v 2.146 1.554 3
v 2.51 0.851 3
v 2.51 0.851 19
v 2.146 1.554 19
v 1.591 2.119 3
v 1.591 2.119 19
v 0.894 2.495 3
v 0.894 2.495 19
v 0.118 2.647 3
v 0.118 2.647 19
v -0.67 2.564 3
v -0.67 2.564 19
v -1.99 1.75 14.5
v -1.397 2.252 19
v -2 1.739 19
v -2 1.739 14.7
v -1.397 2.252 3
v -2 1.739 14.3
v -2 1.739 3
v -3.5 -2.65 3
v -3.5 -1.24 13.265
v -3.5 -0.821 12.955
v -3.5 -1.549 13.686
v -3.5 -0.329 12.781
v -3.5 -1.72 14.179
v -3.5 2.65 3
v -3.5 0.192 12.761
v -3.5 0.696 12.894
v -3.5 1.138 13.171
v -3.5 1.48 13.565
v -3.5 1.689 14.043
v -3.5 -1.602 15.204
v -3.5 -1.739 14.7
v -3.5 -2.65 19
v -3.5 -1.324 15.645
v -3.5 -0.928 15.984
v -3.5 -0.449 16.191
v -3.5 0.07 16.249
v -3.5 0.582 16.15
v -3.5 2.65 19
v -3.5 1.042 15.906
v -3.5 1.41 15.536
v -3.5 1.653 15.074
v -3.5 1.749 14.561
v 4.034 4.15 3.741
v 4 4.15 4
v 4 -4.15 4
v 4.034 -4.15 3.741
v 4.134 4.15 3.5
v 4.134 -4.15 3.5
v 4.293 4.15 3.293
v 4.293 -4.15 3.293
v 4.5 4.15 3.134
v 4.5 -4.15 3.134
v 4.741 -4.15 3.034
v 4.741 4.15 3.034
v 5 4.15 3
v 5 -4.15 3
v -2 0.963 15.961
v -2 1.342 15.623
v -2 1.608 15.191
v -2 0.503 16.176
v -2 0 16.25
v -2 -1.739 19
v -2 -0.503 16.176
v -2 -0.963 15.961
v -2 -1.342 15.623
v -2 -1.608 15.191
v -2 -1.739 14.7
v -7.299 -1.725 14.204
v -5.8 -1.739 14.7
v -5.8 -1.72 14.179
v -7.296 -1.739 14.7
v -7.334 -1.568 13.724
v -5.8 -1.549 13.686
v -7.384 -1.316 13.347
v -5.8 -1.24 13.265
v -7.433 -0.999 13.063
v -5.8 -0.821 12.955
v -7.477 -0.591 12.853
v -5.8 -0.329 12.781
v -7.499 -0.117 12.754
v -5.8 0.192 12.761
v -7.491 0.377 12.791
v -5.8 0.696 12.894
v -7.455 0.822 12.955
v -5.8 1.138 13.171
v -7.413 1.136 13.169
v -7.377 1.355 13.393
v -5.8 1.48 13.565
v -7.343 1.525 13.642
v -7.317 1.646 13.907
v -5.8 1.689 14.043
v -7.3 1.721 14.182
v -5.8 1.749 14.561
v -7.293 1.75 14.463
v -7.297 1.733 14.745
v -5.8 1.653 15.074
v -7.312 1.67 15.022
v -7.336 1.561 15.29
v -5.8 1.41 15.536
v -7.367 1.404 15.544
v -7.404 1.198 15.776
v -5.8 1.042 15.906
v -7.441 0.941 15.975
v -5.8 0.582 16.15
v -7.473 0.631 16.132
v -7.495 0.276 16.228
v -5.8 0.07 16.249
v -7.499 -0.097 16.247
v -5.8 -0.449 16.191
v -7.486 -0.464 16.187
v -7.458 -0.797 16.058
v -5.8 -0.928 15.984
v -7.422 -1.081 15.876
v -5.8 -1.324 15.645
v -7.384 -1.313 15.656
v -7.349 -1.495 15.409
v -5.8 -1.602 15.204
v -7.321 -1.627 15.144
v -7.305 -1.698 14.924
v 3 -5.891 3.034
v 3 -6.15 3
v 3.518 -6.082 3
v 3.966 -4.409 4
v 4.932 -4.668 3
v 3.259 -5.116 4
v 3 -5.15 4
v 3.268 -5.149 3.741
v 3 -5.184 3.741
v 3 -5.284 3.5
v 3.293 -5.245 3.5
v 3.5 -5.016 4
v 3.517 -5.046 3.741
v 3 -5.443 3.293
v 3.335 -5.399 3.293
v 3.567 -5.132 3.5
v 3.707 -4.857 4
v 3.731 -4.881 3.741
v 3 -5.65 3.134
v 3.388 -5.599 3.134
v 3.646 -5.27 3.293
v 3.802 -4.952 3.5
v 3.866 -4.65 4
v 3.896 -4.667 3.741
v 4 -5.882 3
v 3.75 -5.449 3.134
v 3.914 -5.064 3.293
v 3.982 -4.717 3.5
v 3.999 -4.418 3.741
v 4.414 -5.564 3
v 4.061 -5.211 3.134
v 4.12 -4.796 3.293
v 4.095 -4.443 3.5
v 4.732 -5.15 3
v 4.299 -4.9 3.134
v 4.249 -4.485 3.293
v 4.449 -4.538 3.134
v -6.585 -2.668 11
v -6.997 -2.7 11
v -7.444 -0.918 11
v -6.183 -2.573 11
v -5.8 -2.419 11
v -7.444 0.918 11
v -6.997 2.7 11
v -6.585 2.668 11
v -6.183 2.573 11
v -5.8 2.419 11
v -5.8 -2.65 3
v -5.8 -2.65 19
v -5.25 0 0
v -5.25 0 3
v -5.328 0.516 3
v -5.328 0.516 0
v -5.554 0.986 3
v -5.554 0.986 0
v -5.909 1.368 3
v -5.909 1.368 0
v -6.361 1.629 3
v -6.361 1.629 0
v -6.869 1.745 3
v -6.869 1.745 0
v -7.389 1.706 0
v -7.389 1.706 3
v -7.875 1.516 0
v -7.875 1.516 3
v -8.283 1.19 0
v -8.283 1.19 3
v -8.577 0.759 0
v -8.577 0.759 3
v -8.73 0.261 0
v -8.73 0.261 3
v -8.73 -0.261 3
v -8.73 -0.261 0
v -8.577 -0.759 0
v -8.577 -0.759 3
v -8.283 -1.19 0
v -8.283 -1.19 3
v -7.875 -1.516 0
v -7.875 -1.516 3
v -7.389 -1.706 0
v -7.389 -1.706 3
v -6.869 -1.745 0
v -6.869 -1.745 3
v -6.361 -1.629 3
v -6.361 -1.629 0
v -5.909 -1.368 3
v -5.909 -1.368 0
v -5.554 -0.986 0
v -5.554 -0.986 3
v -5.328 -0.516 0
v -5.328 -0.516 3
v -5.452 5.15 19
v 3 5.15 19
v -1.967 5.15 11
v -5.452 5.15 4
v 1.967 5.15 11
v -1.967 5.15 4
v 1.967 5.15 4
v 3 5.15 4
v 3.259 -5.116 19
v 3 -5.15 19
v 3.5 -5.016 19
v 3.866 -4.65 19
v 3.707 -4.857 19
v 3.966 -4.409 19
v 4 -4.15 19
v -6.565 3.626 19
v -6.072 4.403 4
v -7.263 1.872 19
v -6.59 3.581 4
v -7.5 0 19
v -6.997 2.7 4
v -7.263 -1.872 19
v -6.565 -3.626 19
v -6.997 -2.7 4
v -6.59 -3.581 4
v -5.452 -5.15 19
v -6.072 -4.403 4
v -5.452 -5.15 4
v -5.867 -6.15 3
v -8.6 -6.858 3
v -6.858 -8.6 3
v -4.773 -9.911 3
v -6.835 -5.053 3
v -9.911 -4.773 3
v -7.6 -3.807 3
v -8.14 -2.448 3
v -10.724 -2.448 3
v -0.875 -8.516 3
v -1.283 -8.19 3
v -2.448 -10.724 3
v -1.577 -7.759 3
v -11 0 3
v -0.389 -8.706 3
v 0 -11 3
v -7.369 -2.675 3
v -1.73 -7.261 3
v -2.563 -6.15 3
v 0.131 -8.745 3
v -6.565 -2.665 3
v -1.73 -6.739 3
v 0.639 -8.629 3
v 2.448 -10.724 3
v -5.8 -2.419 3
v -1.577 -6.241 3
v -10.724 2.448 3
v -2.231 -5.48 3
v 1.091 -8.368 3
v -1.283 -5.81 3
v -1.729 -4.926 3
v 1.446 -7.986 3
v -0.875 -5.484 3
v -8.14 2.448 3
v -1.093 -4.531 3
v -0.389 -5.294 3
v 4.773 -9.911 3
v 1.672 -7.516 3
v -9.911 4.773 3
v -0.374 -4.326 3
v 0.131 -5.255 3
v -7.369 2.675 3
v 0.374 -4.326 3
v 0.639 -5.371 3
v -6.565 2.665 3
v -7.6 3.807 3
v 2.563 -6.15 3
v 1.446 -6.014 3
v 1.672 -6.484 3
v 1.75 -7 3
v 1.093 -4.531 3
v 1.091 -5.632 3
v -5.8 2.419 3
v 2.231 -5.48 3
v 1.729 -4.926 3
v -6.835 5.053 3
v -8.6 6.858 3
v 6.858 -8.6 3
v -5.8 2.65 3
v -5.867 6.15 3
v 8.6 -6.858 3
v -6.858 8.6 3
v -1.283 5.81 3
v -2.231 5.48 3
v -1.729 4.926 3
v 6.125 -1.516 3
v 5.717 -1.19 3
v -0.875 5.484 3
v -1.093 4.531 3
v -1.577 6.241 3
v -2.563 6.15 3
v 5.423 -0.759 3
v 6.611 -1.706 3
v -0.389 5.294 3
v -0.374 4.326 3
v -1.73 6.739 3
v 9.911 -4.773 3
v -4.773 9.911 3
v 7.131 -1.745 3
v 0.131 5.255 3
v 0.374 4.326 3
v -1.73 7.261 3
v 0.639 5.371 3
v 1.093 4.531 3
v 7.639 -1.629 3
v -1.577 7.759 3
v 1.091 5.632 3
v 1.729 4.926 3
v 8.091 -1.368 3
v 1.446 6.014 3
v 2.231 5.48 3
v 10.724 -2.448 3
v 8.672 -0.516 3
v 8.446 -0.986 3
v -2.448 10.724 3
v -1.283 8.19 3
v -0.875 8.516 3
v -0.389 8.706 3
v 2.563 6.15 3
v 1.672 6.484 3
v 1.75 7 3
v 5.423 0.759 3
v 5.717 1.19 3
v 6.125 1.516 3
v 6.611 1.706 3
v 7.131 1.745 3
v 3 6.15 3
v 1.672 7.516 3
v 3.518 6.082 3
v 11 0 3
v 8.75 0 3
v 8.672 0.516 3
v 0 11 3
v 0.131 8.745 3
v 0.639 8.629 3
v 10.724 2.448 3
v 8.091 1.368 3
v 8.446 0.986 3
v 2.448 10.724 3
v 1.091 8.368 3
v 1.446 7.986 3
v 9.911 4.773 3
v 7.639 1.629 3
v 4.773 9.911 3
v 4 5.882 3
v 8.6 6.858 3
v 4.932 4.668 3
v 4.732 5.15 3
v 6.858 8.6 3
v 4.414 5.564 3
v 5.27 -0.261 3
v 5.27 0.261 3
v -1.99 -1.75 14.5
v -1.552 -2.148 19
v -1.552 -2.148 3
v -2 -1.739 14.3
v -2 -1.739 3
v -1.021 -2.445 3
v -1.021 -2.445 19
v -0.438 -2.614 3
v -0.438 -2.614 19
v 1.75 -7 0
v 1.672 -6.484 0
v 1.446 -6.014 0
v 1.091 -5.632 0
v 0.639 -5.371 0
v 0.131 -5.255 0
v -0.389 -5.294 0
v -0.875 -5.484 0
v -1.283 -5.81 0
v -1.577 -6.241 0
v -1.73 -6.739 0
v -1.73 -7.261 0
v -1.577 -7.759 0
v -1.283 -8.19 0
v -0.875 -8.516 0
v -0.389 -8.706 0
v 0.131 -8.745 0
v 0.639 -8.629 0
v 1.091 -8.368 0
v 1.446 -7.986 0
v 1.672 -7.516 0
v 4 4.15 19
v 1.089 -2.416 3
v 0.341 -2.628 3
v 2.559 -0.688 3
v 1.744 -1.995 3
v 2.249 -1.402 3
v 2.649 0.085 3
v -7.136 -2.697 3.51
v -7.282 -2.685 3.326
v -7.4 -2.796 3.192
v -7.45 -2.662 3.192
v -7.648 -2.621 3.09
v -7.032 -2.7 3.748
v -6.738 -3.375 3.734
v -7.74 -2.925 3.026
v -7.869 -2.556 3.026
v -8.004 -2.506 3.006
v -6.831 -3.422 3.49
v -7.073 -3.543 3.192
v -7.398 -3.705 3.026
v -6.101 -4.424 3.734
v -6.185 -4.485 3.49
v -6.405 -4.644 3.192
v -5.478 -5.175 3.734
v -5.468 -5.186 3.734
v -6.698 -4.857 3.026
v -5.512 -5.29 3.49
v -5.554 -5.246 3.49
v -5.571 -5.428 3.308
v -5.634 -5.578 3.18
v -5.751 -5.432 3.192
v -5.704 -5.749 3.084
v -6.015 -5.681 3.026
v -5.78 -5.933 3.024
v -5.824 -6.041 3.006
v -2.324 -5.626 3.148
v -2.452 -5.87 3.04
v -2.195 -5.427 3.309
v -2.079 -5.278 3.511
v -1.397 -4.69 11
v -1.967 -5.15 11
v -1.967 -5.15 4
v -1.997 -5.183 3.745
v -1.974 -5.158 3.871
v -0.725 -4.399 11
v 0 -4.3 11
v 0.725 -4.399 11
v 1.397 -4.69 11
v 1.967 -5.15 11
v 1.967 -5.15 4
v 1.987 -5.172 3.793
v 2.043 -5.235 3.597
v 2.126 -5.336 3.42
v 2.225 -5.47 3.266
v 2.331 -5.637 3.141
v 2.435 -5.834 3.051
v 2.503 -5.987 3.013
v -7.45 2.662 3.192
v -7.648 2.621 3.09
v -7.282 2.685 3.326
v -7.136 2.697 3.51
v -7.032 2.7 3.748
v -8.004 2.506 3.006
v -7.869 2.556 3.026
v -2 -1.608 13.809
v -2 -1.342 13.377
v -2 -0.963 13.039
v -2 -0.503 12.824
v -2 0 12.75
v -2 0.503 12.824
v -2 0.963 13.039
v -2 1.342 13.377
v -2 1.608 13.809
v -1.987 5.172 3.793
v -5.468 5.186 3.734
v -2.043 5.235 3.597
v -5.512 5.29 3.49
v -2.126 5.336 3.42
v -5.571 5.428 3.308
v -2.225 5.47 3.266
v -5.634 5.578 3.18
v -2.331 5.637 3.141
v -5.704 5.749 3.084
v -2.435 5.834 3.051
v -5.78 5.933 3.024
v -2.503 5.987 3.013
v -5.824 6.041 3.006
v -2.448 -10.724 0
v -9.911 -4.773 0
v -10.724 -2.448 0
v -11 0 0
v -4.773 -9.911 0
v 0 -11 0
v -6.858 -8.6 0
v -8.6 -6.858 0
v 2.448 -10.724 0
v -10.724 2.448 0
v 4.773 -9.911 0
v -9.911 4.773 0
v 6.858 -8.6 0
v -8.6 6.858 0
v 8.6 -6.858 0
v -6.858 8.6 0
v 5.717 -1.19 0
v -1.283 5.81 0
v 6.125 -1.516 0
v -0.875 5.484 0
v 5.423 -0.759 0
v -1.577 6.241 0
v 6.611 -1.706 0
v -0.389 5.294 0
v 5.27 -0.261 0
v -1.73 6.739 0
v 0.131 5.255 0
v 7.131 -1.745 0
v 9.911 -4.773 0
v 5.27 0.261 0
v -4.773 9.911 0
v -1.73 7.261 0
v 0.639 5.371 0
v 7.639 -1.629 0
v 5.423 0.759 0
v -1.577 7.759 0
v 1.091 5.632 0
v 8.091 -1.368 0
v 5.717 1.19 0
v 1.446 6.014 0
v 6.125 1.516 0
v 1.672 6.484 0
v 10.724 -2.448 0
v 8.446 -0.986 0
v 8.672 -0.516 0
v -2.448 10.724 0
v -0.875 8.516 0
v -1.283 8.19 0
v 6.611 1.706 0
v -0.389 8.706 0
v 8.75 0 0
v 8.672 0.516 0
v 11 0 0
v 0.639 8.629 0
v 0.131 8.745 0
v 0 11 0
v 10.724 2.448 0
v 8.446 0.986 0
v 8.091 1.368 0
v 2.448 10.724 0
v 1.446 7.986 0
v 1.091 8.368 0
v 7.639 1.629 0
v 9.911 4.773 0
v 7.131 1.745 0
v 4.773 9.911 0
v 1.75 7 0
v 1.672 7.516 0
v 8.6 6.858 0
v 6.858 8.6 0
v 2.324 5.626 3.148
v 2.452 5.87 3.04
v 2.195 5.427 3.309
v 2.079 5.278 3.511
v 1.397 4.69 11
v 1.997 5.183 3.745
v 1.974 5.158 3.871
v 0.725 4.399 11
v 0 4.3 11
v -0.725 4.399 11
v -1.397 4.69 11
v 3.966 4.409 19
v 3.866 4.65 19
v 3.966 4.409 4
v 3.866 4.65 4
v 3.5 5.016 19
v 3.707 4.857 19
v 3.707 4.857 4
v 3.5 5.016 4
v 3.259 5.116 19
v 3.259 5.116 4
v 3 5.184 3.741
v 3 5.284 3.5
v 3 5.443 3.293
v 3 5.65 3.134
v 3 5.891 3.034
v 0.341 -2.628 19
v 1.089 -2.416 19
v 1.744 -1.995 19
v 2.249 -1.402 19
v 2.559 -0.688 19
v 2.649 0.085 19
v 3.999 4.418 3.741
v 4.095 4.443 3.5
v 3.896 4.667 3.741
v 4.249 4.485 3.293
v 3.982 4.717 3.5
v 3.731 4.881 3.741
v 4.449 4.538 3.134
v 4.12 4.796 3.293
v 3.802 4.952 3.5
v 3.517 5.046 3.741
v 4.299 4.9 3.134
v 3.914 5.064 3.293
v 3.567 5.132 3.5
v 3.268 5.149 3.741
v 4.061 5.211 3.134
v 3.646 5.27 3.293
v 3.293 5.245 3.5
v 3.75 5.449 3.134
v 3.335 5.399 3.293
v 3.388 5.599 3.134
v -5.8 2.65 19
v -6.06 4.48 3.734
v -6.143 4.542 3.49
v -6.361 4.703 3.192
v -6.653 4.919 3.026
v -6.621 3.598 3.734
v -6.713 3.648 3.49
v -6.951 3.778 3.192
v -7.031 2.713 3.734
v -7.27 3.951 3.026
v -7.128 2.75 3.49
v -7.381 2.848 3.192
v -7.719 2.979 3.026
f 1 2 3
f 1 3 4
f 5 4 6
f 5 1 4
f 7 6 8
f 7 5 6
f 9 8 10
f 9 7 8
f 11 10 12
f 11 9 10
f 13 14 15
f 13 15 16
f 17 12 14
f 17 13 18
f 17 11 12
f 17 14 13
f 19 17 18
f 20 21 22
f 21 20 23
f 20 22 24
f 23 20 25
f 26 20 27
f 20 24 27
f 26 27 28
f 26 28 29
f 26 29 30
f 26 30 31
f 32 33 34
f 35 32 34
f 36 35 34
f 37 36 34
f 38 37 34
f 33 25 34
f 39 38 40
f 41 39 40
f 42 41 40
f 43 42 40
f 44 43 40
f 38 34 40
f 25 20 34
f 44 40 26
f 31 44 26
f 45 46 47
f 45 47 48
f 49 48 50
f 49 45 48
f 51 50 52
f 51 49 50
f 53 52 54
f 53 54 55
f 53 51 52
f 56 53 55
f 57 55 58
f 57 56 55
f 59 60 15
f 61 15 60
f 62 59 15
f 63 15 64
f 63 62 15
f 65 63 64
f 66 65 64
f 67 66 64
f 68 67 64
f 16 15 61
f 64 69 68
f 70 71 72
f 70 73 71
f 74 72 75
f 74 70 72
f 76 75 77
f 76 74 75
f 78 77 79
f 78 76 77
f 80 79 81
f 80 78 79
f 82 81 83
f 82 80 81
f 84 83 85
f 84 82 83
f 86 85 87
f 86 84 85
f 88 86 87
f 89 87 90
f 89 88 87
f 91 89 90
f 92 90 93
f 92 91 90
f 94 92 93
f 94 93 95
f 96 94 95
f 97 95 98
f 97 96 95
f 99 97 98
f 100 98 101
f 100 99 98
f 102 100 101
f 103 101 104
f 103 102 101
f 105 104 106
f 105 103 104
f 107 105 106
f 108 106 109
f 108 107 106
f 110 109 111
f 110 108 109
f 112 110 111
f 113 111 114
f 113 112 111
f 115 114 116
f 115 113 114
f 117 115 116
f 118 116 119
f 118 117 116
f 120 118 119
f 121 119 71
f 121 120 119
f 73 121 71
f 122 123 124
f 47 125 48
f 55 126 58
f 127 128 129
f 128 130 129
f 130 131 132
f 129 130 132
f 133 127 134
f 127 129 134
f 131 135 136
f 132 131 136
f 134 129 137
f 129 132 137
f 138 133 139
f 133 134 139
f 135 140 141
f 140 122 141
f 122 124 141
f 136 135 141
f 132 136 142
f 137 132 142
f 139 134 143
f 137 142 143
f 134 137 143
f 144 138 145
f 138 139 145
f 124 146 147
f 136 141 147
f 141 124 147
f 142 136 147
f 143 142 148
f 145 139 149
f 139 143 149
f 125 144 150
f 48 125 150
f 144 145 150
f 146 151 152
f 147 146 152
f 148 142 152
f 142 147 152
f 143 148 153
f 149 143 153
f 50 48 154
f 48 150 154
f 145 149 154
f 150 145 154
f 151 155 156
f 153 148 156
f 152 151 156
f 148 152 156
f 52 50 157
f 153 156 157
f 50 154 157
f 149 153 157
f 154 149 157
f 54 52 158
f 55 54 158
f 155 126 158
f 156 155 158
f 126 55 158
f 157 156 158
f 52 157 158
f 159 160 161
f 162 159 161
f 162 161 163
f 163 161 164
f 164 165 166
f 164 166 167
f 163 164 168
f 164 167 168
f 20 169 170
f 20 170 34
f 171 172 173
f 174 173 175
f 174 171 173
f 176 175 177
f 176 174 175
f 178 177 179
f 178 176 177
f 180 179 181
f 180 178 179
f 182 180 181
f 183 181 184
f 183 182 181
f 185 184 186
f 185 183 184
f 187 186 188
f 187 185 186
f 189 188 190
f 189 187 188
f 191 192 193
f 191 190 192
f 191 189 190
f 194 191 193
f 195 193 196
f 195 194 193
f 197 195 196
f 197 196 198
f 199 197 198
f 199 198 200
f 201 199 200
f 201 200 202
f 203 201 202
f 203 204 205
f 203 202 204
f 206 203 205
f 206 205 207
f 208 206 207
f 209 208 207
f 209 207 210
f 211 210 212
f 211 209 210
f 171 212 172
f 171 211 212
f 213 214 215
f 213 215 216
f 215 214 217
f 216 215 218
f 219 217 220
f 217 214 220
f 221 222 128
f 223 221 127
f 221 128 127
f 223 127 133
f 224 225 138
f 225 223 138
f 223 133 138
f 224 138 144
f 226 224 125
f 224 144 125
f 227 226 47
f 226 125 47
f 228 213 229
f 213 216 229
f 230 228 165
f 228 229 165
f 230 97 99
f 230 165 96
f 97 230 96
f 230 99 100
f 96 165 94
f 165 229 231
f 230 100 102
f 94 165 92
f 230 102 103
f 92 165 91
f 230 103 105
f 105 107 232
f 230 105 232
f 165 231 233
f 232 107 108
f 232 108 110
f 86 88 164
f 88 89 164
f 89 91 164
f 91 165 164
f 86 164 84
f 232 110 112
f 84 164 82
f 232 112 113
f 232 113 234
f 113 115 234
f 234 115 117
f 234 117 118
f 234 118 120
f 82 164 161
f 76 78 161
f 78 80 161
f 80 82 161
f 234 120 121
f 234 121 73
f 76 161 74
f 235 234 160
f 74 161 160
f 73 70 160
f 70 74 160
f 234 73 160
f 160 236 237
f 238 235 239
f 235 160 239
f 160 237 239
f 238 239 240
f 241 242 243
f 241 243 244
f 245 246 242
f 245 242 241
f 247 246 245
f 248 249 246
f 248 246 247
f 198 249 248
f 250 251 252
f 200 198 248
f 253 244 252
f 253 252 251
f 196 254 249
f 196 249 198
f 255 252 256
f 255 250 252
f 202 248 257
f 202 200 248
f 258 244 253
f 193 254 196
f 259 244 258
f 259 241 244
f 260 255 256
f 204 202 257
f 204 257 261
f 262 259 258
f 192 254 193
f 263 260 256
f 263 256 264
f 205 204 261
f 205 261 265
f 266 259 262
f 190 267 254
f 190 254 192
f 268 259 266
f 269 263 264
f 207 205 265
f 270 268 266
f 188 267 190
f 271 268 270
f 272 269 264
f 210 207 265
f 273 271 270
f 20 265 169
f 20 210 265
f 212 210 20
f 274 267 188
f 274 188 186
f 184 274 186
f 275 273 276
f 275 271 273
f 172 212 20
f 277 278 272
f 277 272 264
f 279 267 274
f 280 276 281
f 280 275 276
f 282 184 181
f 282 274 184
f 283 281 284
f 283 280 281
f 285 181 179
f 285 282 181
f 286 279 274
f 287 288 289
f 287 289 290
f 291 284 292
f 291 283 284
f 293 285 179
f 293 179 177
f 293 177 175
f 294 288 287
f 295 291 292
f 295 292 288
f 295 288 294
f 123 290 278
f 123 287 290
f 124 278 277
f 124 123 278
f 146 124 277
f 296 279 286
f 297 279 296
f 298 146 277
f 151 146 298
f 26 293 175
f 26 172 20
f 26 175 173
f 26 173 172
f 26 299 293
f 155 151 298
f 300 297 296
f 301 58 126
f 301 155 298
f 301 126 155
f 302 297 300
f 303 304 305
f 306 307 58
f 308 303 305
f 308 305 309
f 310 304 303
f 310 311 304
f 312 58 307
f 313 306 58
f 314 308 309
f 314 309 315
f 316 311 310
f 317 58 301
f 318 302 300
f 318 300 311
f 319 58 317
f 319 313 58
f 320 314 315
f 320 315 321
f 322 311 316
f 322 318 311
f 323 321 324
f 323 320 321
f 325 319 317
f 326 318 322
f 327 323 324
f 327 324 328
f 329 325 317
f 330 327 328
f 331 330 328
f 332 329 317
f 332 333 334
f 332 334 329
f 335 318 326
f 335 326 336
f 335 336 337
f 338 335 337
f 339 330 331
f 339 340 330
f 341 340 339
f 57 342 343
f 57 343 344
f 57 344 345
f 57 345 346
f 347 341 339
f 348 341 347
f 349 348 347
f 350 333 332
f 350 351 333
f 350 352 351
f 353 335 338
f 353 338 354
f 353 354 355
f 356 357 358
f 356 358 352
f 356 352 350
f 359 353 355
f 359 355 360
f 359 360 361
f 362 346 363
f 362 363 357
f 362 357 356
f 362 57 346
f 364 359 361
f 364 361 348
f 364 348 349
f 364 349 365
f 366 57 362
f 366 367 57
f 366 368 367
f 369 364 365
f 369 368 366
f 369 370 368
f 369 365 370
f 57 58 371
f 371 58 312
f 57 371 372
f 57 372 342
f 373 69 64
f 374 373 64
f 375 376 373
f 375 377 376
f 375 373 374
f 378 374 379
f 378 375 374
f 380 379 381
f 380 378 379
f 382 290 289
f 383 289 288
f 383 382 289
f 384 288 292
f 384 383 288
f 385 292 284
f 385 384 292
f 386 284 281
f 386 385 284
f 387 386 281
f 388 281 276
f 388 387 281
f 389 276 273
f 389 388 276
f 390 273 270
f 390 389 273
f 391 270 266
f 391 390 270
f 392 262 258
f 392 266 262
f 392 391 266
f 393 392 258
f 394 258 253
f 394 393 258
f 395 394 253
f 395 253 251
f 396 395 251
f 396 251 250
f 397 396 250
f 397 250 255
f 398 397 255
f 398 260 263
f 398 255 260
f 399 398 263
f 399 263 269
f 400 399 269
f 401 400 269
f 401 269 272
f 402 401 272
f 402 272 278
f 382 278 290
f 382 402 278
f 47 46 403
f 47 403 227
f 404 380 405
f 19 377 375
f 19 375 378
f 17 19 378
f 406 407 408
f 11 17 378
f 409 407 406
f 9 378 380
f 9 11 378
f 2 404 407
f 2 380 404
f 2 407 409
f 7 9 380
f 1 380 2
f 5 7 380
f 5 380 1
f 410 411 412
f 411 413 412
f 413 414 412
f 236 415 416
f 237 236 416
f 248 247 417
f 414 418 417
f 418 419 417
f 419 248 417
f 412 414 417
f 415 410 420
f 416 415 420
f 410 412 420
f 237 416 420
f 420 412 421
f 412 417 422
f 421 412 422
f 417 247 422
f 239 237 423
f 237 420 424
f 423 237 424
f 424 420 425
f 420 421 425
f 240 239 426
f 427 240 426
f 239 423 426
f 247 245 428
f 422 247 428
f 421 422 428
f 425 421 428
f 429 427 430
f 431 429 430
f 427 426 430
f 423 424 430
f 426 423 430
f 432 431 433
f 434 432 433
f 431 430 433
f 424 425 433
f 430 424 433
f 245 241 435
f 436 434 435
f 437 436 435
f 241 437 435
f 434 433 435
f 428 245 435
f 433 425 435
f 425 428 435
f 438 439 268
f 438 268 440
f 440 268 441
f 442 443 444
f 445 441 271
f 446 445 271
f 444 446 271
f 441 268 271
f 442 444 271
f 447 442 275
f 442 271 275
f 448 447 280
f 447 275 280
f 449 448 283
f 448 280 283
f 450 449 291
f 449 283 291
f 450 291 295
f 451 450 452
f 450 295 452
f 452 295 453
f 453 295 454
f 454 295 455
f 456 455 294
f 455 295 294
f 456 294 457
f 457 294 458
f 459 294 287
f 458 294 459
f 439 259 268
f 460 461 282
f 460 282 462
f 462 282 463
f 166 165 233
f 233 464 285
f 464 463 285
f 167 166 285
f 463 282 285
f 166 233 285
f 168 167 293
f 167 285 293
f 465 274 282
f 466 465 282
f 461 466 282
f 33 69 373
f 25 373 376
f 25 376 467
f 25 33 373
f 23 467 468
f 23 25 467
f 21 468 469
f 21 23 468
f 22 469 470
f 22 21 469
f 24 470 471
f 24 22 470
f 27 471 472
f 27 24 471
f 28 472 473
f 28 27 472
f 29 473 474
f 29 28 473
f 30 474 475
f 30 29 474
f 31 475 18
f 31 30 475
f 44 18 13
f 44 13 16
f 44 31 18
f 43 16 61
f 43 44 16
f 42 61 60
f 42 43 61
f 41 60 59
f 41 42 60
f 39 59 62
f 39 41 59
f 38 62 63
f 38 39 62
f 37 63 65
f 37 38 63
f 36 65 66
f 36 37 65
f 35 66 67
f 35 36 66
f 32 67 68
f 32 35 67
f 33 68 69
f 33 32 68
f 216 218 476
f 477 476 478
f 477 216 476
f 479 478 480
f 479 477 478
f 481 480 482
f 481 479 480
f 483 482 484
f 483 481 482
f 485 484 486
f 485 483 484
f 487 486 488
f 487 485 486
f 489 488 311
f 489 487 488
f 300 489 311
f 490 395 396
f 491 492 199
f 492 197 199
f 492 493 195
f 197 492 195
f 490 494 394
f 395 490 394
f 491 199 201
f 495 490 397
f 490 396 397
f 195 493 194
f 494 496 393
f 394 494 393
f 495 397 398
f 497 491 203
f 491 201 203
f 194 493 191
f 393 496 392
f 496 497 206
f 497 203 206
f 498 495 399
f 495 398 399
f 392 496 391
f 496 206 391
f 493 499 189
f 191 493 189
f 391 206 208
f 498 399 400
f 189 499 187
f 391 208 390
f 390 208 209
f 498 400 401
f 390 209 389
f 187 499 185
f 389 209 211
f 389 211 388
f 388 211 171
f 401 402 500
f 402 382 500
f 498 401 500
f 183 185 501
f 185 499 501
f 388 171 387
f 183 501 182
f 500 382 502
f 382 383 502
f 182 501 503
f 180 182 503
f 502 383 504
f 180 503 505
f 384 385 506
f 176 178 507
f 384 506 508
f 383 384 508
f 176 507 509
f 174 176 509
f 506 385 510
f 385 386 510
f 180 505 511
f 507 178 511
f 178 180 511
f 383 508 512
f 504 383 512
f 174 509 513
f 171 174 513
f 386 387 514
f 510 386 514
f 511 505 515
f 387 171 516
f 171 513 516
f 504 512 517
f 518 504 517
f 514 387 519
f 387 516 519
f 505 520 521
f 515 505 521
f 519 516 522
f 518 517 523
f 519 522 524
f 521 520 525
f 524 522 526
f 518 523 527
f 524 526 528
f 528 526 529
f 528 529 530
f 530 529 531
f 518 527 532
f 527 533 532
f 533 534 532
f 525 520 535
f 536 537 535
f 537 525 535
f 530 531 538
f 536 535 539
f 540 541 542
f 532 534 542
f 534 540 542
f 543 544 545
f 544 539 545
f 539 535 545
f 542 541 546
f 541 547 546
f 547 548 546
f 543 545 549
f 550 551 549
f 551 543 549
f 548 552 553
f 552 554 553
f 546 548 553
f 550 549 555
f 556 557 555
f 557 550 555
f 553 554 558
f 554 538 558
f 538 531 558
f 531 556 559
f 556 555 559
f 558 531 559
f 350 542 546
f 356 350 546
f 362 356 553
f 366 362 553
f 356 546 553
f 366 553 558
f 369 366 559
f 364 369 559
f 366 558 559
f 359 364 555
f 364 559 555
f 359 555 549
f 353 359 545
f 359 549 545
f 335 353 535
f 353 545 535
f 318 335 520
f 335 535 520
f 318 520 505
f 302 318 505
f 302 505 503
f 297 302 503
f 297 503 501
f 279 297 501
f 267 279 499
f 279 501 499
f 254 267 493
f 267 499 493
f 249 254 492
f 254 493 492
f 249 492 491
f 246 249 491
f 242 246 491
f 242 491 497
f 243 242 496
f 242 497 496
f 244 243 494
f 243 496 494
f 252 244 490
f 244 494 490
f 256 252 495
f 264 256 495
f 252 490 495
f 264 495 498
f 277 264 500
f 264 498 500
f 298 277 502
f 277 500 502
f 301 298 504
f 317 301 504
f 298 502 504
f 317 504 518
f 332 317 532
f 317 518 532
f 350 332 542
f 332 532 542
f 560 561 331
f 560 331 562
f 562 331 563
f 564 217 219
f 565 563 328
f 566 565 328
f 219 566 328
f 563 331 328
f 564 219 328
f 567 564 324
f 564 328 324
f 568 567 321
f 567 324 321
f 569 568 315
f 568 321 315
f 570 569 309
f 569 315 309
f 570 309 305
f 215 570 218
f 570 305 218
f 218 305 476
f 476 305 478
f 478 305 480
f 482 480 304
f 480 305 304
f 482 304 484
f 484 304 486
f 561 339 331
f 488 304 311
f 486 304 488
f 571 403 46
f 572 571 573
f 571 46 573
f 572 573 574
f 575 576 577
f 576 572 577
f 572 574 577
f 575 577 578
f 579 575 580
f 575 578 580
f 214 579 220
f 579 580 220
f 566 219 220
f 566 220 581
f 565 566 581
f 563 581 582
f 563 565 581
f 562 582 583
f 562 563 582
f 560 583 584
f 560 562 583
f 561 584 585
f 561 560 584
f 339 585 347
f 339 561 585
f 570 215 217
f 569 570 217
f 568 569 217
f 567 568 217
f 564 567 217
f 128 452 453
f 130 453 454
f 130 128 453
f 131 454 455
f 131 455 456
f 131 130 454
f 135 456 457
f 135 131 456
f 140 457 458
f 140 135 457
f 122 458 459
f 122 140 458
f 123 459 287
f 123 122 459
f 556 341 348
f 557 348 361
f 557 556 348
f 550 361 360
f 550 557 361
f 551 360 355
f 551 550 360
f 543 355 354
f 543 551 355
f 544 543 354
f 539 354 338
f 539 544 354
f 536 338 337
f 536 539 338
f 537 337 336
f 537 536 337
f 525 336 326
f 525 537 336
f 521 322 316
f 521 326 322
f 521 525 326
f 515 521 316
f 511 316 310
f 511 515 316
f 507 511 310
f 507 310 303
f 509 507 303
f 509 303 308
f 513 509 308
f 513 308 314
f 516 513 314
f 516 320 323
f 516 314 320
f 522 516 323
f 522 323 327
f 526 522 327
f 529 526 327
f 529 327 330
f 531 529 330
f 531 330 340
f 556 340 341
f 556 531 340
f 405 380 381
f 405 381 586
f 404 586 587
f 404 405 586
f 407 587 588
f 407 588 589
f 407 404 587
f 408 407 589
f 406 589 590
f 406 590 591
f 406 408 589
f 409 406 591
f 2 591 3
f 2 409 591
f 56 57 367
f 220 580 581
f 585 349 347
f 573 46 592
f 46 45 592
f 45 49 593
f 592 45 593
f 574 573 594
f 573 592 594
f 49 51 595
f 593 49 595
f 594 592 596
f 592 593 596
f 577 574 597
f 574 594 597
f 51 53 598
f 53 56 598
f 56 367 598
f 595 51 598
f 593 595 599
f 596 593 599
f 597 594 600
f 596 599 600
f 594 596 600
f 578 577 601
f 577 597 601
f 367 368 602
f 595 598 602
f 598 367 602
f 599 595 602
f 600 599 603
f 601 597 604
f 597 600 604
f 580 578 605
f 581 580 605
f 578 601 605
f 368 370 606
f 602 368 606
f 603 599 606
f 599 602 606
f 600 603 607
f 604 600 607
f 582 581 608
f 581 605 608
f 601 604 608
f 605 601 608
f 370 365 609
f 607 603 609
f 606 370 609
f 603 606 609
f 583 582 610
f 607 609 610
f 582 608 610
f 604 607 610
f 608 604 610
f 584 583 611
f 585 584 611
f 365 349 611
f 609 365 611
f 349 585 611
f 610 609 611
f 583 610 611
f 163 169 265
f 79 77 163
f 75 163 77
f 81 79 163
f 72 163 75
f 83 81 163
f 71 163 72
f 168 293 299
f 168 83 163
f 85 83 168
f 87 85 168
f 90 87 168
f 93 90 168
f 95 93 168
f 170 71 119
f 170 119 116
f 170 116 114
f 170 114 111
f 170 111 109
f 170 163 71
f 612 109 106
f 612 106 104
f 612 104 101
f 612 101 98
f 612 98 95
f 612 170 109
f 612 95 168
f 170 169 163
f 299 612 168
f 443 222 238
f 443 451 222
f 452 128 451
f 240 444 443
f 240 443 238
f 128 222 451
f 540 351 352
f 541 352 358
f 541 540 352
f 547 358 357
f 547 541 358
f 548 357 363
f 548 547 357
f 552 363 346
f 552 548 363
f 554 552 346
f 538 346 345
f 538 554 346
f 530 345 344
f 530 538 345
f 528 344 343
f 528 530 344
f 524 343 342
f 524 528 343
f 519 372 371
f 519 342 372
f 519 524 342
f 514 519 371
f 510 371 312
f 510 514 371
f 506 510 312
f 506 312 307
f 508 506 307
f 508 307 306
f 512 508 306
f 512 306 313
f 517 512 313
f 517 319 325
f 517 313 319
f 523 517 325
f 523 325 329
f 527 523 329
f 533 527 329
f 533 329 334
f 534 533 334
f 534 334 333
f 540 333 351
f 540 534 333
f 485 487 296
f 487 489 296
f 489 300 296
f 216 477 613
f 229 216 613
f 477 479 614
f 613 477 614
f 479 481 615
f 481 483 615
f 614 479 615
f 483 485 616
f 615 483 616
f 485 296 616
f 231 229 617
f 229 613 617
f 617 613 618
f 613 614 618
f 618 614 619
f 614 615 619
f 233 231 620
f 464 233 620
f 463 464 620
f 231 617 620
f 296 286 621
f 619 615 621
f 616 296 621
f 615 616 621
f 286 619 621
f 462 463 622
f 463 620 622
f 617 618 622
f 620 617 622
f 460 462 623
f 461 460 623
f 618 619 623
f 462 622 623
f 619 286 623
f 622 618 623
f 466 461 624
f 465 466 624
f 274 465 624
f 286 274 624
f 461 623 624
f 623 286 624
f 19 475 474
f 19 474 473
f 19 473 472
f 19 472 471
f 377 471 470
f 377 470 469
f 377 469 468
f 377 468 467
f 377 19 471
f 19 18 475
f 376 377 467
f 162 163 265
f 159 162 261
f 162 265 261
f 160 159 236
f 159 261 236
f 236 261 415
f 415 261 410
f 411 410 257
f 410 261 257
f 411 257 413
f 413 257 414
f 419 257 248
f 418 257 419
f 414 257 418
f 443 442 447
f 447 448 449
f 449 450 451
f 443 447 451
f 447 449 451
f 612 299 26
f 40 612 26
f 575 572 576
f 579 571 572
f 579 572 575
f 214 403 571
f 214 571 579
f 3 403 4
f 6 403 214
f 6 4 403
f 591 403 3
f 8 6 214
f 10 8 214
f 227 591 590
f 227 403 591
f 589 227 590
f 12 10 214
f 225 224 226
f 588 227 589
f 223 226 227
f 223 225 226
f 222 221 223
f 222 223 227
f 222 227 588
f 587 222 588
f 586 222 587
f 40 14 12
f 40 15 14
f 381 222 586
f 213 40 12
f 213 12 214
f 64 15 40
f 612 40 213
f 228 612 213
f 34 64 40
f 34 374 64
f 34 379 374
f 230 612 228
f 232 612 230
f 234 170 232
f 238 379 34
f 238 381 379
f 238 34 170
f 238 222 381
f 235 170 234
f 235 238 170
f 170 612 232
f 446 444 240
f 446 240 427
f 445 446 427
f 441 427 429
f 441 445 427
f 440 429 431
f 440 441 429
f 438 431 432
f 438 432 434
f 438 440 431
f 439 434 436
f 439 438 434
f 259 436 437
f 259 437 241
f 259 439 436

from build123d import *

# Parameters (mm, degrees)
SKETCH_1_R          = 11
SKETCH_1_R_2        = 1.75
EXTRUDE_1_DEPTH     = 3
SKETCH_2_R          = 7.5
EXTRUDE_2_DEPTH     = 16
SKETCH_10_W         = 2.3
SKETCH_10_H         = 5.3
CUT_EXTRUDE_4_DEPTH = 16
CUT_EXTRUDE_START   = -16
CUT_EXTRUDE_5_DEPTH = 16
SKETCH_13_R         = 2.7
CUT_EXTRUDE_6_DEPTH = 8
FILLET_1_R          = 1
SKETCH_15_R         = 1.75
CUT_EXTRUDE_7_DEPTH = 10


with BuildPart() as part:
    # 草图1 → 凸台-拉伸1 (new body)
    with BuildSketch(Plane.XY):
        Circle(SKETCH_1_R)
        with Locations((0, 7)):
            Circle(SKETCH_1_R_2, mode=Mode.SUBTRACT)
        with Locations((7, 0)):
            Circle(SKETCH_1_R_2, mode=Mode.SUBTRACT)
        with Locations((0, -7)):
            Circle(SKETCH_1_R_2, mode=Mode.SUBTRACT)
        with Locations((-7, 0)):
            Circle(SKETCH_1_R_2, mode=Mode.SUBTRACT)
    extrude(amount=EXTRUDE_1_DEPTH)

    # 草图2 → 凸台-拉伸2 (add)
    with BuildSketch(Plane.XY.offset(3)):
        with Locations(Location((0, 0, 0), (0, 0, 166.708822757))):
            Circle(SKETCH_2_R)
        with BuildLine():
            Line((-2, 1.738533865), (-2, -1.738533865))
            ThreePointArc((-2, -1.738533865), (-1.295035867, -2.31200824), (-0.437775279, -2.613590022))
            ThreePointArc((-0.437775279, -2.613590022), (2.018459157, -1.717068034), (2.50959842, 0.851126176))
            ThreePointArc((2.50959842, 0.851126176), (0.511659788, 2.600135431), (-2, 1.738533865))
        make_face(mode=Mode.SUBTRACT)
    extrude(amount=EXTRUDE_2_DEPTH)

    # 草图10 → 切除-拉伸4 (cut)
    with BuildSketch(Plane.XY.offset(19)):
        with Locations((-4.65, 0)):
            Rectangle(SKETCH_10_W, SKETCH_10_H)
    extrude(amount=-CUT_EXTRUDE_4_DEPTH, mode=Mode.SUBTRACT)

    # 草图12 → 切除-拉伸5 (cut)
    with BuildSketch(Plane.XY.offset(19).offset(CUT_EXTRUDE_START)):
        with BuildLine():
            Line((-5.452293096, 5.15), (4, 5.15))
            Line((4, 5.15), (4, -5.15))
            Line((4, -5.15), (-5.452293096, -5.15))
            ThreePointArc((-5.452293096, -5.15), (7.5, 0), (-5.452293096, 5.15))
        make_face()
    extrude(amount=CUT_EXTRUDE_5_DEPTH, mode=Mode.SUBTRACT)

    # 草图13 → 切除-拉伸6 (cut)
    with BuildSketch(Plane.XY.offset(3)):
        with Locations((0, 7)):
            Circle(SKETCH_13_R)
        with Locations((7, 0)):
            Circle(SKETCH_13_R)
        with Locations((0, -7)):
            Circle(SKETCH_13_R)
        with Locations((-7, 0)):
            Circle(SKETCH_13_R)
    extrude(amount=CUT_EXTRUDE_6_DEPTH, mode=Mode.SUBTRACT)

    # 圆角1
    # the kernel refuses this fillet: 1 mm, written as the material it adds along each edge
    with BuildSketch(Plane(origin=(0, 0, 3), x_dir=(-0.46227667345108353, 0.8867357425879484, 0), z_dir=(0.8867357425879484, 0.46227667345108353, 0))) as fillet_1_piece_1_section:
        with BuildLine():
            CenterArc((7.5 + FILLET_1_R, FILLET_1_R), FILLET_1_R, 180, 90)
            Line((7.5, FILLET_1_R), (7.5, 0))
            Line((7.5, 0), (7.5 + FILLET_1_R, 0))
        make_face()
    fillet_1_piece_1 = revolve(axis=Axis((0, 0, 3), (0, 0, 1)), revolution_arc=60.46476408, mode=Mode.PRIVATE)
    fillet_1_piece_1 = fillet_1_piece_1 - Plane(origin=(-7, 0, 3.226381538), x_dir=(1, 0, 0), z_dir=(0, 0, -1)) * Cylinder(2.7, 34, mode=Mode.PRIVATE)
    fillet_1_piece_1 = split(fillet_1_piece_1, bisect_by=Plane(origin=(-6.580020659, 5.15, 3.226381538), z_dir=(0, -1, 0)), keep=Keep.TOP, mode=Mode.PRIVATE)
    add(fillet_1_piece_1)
    with BuildSketch(Plane(origin=(0.533403956, -5.15, 3), x_dir=(0, -1, 0), z_dir=(-1, 0, 0))) as fillet_1_piece_2_section:
        with BuildLine():
            CenterArc((FILLET_1_R, FILLET_1_R), FILLET_1_R, 180, 90)
            Line((0, FILLET_1_R), (0, 0))
            Line((0, 0), (FILLET_1_R, 0))
        make_face()
    fillet_1_piece_2 = extrude(amount=8.485697052, mode=Mode.PRIVATE)
    fillet_1_piece_2 = fillet_1_piece_2 - Plane(origin=(0, -7, 3.242251881), x_dir=(1, 0, 0), z_dir=(0, 0, -1)) * Cylinder(2.7, 21, mode=Mode.PRIVATE)
    fillet_1_piece_2 = fillet_1_piece_2 & Plane(origin=(0, 0, 3.242251881), x_dir=(-0.9732142857144194, 0.2298998783848582, 0), z_dir=(0, 0, -1)) * Cylinder(7.5, 21, mode=Mode.PRIVATE)
    add(fillet_1_piece_2)
    with BuildSketch(Plane(origin=(-7.952293096, 5.15, 3), x_dir=(0, 1, 0), z_dir=(1, 0, 0))) as fillet_1_piece_3_section:
        with BuildLine():
            CenterArc((FILLET_1_R, FILLET_1_R), FILLET_1_R, 180, 90)
            Line((0, FILLET_1_R), (0, 0))
            Line((0, 0), (FILLET_1_R, 0))
        make_face()
    fillet_1_piece_3 = extrude(amount=8.485697052, mode=Mode.PRIVATE)
    fillet_1_piece_3 = fillet_1_piece_3 - Plane(origin=(0, 7, 3.242252003), x_dir=(1, 0, 0), z_dir=(0, 0, -1)) * Cylinder(2.7, 21, mode=Mode.PRIVATE)
    fillet_1_piece_3 = fillet_1_piece_3 & Plane(origin=(0, 0, 3.242252003), x_dir=(-0.9732142857144194, 0.2298998783848582, 0), z_dir=(0, 0, -1)) * Cylinder(7.5, 21, mode=Mode.PRIVATE)
    add(fillet_1_piece_3)
    with BuildSketch(Plane(origin=(0, 0, 3), x_dir=(-0.9993901440206632, -0.034919049734468105, 0), z_dir=(-0.034919049734468105, 0.9993901440206632, 0))) as fillet_1_piece_4_section:
        with BuildLine():
            CenterArc((7.5 + FILLET_1_R, FILLET_1_R), FILLET_1_R, 180, 90)
            Line((7.5, FILLET_1_R), (7.5, 0))
            Line((7.5, 0), (7.5 + FILLET_1_R, 0))
        make_face()
    fillet_1_piece_4 = revolve(axis=Axis((0, 0, 3), (0, 0, 1)), revolution_arc=60.46476408, mode=Mode.PRIVATE)
    fillet_1_piece_4 = fillet_1_piece_4 - Plane(origin=(-7, 0, 3.226381502), x_dir=(1, 0, 0), z_dir=(0, 0, -1)) * Cylinder(2.7, 35, mode=Mode.PRIVATE)
    fillet_1_piece_4 = split(fillet_1_piece_4, bisect_by=Plane(origin=(-6.580021181, -5.15, 3.226381502), z_dir=(0, 1, 0)), keep=Keep.TOP, mode=Mode.PRIVATE)
    add(fillet_1_piece_4)
    with BuildSketch(Plane(origin=(0, 0, 3), x_dir=(-0.46227667345108353, 0.8867357425879484, 0), z_dir=(0.8867357425879484, 0.46227667345108353, 0))) as fillet_1_piece_5a_section:
        with BuildLine():
            CenterArc((7.5 + FILLET_1_R, FILLET_1_R), FILLET_1_R, 180, 90)
            Line((7.5, FILLET_1_R), (7.5, 0))
            Line((7.5, 0), (7.5 + FILLET_1_R, 0))
        make_face()
    fillet_1_piece_5a = revolve(axis=Axis((0, 0, 3), (0, 0, 1)), revolution_arc=60.46476408, mode=Mode.PRIVATE)
    fillet_1_piece_5a = split(fillet_1_piece_5a, bisect_by=Plane(origin=(-4.735225186, 5.15, 3.214069689), z_dir=(0, 1, 0)), keep=Keep.TOP, mode=Mode.PRIVATE)
    with BuildSketch(Plane(origin=(-7.952293096, 5.15, 3), x_dir=(0, 1, 0), z_dir=(1, 0, 0))) as fillet_1_piece_5b_section:
        with BuildLine():
            CenterArc((FILLET_1_R, FILLET_1_R), FILLET_1_R, 180, 90)
            Line((0, FILLET_1_R), (0, 0))
            Line((0, 0), (FILLET_1_R, 0))
        make_face()
    fillet_1_piece_5b = extrude(amount=8.485697052, mode=Mode.PRIVATE)
    fillet_1_piece_5b = fillet_1_piece_5b - Plane(origin=(0, 0, 3.215737548), x_dir=(-0.9732142857144194, 0.2298998783848582, 0), z_dir=(0, 0, -1)) * Cylinder(7.5, 21, mode=Mode.PRIVATE)
    fillet_1_piece_5 = fillet_1_piece_5a & fillet_1_piece_5b
    add(fillet_1_piece_5)
    with BuildSketch(Plane(origin=(0.533403956, -5.15, 3), x_dir=(0, -1, 0), z_dir=(-1, 0, 0))) as fillet_1_piece_6a_section:
        with BuildLine():
            CenterArc((FILLET_1_R, FILLET_1_R), FILLET_1_R, 180, 90)
            Line((0, FILLET_1_R), (0, 0))
            Line((0, 0), (FILLET_1_R, 0))
        make_face()
    fillet_1_piece_6a = extrude(amount=8.485697052, mode=Mode.PRIVATE)
    fillet_1_piece_6a = fillet_1_piece_6a - Plane(origin=(0, 0, 3.215737542), x_dir=(-0.9732142857144194, 0.2298998783848582, 0), z_dir=(0, 0, -1)) * Cylinder(7.5, 21, mode=Mode.PRIVATE)
    with BuildSketch(Plane(origin=(0, 0, 3), x_dir=(-0.9993901440206632, -0.034919049734468105, 0), z_dir=(-0.034919049734468105, 0.9993901440206632, 0))) as fillet_1_piece_6b_section:
        with BuildLine():
            CenterArc((7.5 + FILLET_1_R, FILLET_1_R), FILLET_1_R, 180, 90)
            Line((7.5, FILLET_1_R), (7.5, 0))
            Line((7.5, 0), (7.5 + FILLET_1_R, 0))
        make_face()
    fillet_1_piece_6b = revolve(axis=Axis((0, 0, 3), (0, 0, 1)), revolution_arc=60.46476408, mode=Mode.PRIVATE)
    fillet_1_piece_6b = split(fillet_1_piece_6b, bisect_by=Plane(origin=(-4.735225263, -5.15, 3.214069799), z_dir=(0, -1, 0)), keep=Keep.TOP, mode=Mode.PRIVATE)
    fillet_1_piece_6 = fillet_1_piece_6a & fillet_1_piece_6b
    add(fillet_1_piece_6)
    # the kernel refuses this fillet: 1 mm, written as the material it takes off along each edge
    with BuildSketch(Plane(origin=(4, -5.15, 3), x_dir=(-1, 0, 0), z_dir=(0, 0, 1)), Plane(origin=(4, 5.15, 3), x_dir=(0, -1, 0), z_dir=(0, 0, 1))) as fillet_1_2_piece_1:
        with BuildLine():
            CenterArc((FILLET_1_R, -FILLET_1_R), FILLET_1_R, 90, 90)
            Line((0, -FILLET_1_R), (0, 0))
            Line((0, 0), (FILLET_1_R, 0))
        make_face()
    extrude(amount=18.5, mode=Mode.SUBTRACT)
    # the kernel refuses this fillet: 1 mm, written as the material it adds along each edge
    with BuildSketch(Plane(origin=(4, 4.15, 3), x_dir=(1, 0, 0), z_dir=(0, -1, 0))) as fillet_1_3_piece_1:
        with BuildLine():
            CenterArc((FILLET_1_R, FILLET_1_R), FILLET_1_R, 180, 90)
            Line((0, FILLET_1_R), (0, 0))
            Line((0, 0), (FILLET_1_R, 0))
        make_face()
    extrude(amount=8.3)
    with BuildSketch(Plane(origin=(-0.533403956, 5.15, 3), x_dir=(0, 1, 0), z_dir=(1, 0, 0))) as fillet_1_3_piece_2_section:
        with BuildLine():
            CenterArc((FILLET_1_R, FILLET_1_R), FILLET_1_R, 180, 90)
            Line((0, FILLET_1_R), (0, 0))
            Line((0, 0), (FILLET_1_R, 0))
        make_face()
    fillet_1_3_piece_2 = extrude(amount=3.533403956, mode=Mode.PRIVATE)
    fillet_1_3_piece_2 = fillet_1_3_piece_2 - Plane(origin=(0, 7, 3.249320301), x_dir=(1, 0, 0), z_dir=(0, 0, -1)) * Cylinder(2.7, 12, mode=Mode.PRIVATE)
    add(fillet_1_3_piece_2)
    with BuildSketch(Plane(origin=(3, -5.15, 3), x_dir=(0, -1, 0), z_dir=(-1, 0, 0))) as fillet_1_3_piece_3_section:
        with BuildLine():
            CenterArc((FILLET_1_R, FILLET_1_R), FILLET_1_R, 180, 90)
            Line((0, FILLET_1_R), (0, 0))
            Line((0, 0), (FILLET_1_R, 0))
        make_face()
    fillet_1_3_piece_3 = extrude(amount=3.533403956, mode=Mode.PRIVATE)
    fillet_1_3_piece_3 = fillet_1_3_piece_3 - Plane(origin=(0, -7, 3.249320301), x_dir=(1, 0, 0), z_dir=(0, 0, -1)) * Cylinder(2.7, 12, mode=Mode.PRIVATE)
    add(fillet_1_3_piece_3)
    with BuildSketch(Plane(origin=(3, -4.15, 3), x_dir=(0, -1, 0), z_dir=(-1, 0, 0))) as fillet_1_3_piece_4:
        with BuildLine():
            CenterArc((1 + FILLET_1_R, FILLET_1_R), FILLET_1_R, 180, 90)
            Line((1, FILLET_1_R), (1, 0))
            Line((1, 0), (1 + FILLET_1_R, 0))
        make_face()
    revolve(axis=Axis((3, -4.15, 3), (0, 0, 1)), revolution_arc=90)
    with BuildSketch(Plane(origin=(3, 4.15, 3), x_dir=(1, 0, 0), z_dir=(0, -1, 0))) as fillet_1_3_piece_5:
        with BuildLine():
            CenterArc((1 + FILLET_1_R, FILLET_1_R), FILLET_1_R, 180, 90)
            Line((1, FILLET_1_R), (1, 0))
            Line((1, 0), (1 + FILLET_1_R, 0))
        make_face()
    revolve(axis=Axis((3, 4.15, 3), (0, 0, 1)), revolution_arc=90)

    # 草图15 → 切除-拉伸7 (cut)
    with BuildSketch(Plane(origin=(-10.8, 0, 0), x_dir=(0, 0, -1), z_dir=(1, 0, 0))):
        with Locations(Location((-14.5, 0, 0), (0, 0, 263.437572131))):
            Circle(SKETCH_15_R)
    extrude(amount=CUT_EXTRUDE_7_DEPTH, mode=Mode.SUBTRACT)


solid = part.part
